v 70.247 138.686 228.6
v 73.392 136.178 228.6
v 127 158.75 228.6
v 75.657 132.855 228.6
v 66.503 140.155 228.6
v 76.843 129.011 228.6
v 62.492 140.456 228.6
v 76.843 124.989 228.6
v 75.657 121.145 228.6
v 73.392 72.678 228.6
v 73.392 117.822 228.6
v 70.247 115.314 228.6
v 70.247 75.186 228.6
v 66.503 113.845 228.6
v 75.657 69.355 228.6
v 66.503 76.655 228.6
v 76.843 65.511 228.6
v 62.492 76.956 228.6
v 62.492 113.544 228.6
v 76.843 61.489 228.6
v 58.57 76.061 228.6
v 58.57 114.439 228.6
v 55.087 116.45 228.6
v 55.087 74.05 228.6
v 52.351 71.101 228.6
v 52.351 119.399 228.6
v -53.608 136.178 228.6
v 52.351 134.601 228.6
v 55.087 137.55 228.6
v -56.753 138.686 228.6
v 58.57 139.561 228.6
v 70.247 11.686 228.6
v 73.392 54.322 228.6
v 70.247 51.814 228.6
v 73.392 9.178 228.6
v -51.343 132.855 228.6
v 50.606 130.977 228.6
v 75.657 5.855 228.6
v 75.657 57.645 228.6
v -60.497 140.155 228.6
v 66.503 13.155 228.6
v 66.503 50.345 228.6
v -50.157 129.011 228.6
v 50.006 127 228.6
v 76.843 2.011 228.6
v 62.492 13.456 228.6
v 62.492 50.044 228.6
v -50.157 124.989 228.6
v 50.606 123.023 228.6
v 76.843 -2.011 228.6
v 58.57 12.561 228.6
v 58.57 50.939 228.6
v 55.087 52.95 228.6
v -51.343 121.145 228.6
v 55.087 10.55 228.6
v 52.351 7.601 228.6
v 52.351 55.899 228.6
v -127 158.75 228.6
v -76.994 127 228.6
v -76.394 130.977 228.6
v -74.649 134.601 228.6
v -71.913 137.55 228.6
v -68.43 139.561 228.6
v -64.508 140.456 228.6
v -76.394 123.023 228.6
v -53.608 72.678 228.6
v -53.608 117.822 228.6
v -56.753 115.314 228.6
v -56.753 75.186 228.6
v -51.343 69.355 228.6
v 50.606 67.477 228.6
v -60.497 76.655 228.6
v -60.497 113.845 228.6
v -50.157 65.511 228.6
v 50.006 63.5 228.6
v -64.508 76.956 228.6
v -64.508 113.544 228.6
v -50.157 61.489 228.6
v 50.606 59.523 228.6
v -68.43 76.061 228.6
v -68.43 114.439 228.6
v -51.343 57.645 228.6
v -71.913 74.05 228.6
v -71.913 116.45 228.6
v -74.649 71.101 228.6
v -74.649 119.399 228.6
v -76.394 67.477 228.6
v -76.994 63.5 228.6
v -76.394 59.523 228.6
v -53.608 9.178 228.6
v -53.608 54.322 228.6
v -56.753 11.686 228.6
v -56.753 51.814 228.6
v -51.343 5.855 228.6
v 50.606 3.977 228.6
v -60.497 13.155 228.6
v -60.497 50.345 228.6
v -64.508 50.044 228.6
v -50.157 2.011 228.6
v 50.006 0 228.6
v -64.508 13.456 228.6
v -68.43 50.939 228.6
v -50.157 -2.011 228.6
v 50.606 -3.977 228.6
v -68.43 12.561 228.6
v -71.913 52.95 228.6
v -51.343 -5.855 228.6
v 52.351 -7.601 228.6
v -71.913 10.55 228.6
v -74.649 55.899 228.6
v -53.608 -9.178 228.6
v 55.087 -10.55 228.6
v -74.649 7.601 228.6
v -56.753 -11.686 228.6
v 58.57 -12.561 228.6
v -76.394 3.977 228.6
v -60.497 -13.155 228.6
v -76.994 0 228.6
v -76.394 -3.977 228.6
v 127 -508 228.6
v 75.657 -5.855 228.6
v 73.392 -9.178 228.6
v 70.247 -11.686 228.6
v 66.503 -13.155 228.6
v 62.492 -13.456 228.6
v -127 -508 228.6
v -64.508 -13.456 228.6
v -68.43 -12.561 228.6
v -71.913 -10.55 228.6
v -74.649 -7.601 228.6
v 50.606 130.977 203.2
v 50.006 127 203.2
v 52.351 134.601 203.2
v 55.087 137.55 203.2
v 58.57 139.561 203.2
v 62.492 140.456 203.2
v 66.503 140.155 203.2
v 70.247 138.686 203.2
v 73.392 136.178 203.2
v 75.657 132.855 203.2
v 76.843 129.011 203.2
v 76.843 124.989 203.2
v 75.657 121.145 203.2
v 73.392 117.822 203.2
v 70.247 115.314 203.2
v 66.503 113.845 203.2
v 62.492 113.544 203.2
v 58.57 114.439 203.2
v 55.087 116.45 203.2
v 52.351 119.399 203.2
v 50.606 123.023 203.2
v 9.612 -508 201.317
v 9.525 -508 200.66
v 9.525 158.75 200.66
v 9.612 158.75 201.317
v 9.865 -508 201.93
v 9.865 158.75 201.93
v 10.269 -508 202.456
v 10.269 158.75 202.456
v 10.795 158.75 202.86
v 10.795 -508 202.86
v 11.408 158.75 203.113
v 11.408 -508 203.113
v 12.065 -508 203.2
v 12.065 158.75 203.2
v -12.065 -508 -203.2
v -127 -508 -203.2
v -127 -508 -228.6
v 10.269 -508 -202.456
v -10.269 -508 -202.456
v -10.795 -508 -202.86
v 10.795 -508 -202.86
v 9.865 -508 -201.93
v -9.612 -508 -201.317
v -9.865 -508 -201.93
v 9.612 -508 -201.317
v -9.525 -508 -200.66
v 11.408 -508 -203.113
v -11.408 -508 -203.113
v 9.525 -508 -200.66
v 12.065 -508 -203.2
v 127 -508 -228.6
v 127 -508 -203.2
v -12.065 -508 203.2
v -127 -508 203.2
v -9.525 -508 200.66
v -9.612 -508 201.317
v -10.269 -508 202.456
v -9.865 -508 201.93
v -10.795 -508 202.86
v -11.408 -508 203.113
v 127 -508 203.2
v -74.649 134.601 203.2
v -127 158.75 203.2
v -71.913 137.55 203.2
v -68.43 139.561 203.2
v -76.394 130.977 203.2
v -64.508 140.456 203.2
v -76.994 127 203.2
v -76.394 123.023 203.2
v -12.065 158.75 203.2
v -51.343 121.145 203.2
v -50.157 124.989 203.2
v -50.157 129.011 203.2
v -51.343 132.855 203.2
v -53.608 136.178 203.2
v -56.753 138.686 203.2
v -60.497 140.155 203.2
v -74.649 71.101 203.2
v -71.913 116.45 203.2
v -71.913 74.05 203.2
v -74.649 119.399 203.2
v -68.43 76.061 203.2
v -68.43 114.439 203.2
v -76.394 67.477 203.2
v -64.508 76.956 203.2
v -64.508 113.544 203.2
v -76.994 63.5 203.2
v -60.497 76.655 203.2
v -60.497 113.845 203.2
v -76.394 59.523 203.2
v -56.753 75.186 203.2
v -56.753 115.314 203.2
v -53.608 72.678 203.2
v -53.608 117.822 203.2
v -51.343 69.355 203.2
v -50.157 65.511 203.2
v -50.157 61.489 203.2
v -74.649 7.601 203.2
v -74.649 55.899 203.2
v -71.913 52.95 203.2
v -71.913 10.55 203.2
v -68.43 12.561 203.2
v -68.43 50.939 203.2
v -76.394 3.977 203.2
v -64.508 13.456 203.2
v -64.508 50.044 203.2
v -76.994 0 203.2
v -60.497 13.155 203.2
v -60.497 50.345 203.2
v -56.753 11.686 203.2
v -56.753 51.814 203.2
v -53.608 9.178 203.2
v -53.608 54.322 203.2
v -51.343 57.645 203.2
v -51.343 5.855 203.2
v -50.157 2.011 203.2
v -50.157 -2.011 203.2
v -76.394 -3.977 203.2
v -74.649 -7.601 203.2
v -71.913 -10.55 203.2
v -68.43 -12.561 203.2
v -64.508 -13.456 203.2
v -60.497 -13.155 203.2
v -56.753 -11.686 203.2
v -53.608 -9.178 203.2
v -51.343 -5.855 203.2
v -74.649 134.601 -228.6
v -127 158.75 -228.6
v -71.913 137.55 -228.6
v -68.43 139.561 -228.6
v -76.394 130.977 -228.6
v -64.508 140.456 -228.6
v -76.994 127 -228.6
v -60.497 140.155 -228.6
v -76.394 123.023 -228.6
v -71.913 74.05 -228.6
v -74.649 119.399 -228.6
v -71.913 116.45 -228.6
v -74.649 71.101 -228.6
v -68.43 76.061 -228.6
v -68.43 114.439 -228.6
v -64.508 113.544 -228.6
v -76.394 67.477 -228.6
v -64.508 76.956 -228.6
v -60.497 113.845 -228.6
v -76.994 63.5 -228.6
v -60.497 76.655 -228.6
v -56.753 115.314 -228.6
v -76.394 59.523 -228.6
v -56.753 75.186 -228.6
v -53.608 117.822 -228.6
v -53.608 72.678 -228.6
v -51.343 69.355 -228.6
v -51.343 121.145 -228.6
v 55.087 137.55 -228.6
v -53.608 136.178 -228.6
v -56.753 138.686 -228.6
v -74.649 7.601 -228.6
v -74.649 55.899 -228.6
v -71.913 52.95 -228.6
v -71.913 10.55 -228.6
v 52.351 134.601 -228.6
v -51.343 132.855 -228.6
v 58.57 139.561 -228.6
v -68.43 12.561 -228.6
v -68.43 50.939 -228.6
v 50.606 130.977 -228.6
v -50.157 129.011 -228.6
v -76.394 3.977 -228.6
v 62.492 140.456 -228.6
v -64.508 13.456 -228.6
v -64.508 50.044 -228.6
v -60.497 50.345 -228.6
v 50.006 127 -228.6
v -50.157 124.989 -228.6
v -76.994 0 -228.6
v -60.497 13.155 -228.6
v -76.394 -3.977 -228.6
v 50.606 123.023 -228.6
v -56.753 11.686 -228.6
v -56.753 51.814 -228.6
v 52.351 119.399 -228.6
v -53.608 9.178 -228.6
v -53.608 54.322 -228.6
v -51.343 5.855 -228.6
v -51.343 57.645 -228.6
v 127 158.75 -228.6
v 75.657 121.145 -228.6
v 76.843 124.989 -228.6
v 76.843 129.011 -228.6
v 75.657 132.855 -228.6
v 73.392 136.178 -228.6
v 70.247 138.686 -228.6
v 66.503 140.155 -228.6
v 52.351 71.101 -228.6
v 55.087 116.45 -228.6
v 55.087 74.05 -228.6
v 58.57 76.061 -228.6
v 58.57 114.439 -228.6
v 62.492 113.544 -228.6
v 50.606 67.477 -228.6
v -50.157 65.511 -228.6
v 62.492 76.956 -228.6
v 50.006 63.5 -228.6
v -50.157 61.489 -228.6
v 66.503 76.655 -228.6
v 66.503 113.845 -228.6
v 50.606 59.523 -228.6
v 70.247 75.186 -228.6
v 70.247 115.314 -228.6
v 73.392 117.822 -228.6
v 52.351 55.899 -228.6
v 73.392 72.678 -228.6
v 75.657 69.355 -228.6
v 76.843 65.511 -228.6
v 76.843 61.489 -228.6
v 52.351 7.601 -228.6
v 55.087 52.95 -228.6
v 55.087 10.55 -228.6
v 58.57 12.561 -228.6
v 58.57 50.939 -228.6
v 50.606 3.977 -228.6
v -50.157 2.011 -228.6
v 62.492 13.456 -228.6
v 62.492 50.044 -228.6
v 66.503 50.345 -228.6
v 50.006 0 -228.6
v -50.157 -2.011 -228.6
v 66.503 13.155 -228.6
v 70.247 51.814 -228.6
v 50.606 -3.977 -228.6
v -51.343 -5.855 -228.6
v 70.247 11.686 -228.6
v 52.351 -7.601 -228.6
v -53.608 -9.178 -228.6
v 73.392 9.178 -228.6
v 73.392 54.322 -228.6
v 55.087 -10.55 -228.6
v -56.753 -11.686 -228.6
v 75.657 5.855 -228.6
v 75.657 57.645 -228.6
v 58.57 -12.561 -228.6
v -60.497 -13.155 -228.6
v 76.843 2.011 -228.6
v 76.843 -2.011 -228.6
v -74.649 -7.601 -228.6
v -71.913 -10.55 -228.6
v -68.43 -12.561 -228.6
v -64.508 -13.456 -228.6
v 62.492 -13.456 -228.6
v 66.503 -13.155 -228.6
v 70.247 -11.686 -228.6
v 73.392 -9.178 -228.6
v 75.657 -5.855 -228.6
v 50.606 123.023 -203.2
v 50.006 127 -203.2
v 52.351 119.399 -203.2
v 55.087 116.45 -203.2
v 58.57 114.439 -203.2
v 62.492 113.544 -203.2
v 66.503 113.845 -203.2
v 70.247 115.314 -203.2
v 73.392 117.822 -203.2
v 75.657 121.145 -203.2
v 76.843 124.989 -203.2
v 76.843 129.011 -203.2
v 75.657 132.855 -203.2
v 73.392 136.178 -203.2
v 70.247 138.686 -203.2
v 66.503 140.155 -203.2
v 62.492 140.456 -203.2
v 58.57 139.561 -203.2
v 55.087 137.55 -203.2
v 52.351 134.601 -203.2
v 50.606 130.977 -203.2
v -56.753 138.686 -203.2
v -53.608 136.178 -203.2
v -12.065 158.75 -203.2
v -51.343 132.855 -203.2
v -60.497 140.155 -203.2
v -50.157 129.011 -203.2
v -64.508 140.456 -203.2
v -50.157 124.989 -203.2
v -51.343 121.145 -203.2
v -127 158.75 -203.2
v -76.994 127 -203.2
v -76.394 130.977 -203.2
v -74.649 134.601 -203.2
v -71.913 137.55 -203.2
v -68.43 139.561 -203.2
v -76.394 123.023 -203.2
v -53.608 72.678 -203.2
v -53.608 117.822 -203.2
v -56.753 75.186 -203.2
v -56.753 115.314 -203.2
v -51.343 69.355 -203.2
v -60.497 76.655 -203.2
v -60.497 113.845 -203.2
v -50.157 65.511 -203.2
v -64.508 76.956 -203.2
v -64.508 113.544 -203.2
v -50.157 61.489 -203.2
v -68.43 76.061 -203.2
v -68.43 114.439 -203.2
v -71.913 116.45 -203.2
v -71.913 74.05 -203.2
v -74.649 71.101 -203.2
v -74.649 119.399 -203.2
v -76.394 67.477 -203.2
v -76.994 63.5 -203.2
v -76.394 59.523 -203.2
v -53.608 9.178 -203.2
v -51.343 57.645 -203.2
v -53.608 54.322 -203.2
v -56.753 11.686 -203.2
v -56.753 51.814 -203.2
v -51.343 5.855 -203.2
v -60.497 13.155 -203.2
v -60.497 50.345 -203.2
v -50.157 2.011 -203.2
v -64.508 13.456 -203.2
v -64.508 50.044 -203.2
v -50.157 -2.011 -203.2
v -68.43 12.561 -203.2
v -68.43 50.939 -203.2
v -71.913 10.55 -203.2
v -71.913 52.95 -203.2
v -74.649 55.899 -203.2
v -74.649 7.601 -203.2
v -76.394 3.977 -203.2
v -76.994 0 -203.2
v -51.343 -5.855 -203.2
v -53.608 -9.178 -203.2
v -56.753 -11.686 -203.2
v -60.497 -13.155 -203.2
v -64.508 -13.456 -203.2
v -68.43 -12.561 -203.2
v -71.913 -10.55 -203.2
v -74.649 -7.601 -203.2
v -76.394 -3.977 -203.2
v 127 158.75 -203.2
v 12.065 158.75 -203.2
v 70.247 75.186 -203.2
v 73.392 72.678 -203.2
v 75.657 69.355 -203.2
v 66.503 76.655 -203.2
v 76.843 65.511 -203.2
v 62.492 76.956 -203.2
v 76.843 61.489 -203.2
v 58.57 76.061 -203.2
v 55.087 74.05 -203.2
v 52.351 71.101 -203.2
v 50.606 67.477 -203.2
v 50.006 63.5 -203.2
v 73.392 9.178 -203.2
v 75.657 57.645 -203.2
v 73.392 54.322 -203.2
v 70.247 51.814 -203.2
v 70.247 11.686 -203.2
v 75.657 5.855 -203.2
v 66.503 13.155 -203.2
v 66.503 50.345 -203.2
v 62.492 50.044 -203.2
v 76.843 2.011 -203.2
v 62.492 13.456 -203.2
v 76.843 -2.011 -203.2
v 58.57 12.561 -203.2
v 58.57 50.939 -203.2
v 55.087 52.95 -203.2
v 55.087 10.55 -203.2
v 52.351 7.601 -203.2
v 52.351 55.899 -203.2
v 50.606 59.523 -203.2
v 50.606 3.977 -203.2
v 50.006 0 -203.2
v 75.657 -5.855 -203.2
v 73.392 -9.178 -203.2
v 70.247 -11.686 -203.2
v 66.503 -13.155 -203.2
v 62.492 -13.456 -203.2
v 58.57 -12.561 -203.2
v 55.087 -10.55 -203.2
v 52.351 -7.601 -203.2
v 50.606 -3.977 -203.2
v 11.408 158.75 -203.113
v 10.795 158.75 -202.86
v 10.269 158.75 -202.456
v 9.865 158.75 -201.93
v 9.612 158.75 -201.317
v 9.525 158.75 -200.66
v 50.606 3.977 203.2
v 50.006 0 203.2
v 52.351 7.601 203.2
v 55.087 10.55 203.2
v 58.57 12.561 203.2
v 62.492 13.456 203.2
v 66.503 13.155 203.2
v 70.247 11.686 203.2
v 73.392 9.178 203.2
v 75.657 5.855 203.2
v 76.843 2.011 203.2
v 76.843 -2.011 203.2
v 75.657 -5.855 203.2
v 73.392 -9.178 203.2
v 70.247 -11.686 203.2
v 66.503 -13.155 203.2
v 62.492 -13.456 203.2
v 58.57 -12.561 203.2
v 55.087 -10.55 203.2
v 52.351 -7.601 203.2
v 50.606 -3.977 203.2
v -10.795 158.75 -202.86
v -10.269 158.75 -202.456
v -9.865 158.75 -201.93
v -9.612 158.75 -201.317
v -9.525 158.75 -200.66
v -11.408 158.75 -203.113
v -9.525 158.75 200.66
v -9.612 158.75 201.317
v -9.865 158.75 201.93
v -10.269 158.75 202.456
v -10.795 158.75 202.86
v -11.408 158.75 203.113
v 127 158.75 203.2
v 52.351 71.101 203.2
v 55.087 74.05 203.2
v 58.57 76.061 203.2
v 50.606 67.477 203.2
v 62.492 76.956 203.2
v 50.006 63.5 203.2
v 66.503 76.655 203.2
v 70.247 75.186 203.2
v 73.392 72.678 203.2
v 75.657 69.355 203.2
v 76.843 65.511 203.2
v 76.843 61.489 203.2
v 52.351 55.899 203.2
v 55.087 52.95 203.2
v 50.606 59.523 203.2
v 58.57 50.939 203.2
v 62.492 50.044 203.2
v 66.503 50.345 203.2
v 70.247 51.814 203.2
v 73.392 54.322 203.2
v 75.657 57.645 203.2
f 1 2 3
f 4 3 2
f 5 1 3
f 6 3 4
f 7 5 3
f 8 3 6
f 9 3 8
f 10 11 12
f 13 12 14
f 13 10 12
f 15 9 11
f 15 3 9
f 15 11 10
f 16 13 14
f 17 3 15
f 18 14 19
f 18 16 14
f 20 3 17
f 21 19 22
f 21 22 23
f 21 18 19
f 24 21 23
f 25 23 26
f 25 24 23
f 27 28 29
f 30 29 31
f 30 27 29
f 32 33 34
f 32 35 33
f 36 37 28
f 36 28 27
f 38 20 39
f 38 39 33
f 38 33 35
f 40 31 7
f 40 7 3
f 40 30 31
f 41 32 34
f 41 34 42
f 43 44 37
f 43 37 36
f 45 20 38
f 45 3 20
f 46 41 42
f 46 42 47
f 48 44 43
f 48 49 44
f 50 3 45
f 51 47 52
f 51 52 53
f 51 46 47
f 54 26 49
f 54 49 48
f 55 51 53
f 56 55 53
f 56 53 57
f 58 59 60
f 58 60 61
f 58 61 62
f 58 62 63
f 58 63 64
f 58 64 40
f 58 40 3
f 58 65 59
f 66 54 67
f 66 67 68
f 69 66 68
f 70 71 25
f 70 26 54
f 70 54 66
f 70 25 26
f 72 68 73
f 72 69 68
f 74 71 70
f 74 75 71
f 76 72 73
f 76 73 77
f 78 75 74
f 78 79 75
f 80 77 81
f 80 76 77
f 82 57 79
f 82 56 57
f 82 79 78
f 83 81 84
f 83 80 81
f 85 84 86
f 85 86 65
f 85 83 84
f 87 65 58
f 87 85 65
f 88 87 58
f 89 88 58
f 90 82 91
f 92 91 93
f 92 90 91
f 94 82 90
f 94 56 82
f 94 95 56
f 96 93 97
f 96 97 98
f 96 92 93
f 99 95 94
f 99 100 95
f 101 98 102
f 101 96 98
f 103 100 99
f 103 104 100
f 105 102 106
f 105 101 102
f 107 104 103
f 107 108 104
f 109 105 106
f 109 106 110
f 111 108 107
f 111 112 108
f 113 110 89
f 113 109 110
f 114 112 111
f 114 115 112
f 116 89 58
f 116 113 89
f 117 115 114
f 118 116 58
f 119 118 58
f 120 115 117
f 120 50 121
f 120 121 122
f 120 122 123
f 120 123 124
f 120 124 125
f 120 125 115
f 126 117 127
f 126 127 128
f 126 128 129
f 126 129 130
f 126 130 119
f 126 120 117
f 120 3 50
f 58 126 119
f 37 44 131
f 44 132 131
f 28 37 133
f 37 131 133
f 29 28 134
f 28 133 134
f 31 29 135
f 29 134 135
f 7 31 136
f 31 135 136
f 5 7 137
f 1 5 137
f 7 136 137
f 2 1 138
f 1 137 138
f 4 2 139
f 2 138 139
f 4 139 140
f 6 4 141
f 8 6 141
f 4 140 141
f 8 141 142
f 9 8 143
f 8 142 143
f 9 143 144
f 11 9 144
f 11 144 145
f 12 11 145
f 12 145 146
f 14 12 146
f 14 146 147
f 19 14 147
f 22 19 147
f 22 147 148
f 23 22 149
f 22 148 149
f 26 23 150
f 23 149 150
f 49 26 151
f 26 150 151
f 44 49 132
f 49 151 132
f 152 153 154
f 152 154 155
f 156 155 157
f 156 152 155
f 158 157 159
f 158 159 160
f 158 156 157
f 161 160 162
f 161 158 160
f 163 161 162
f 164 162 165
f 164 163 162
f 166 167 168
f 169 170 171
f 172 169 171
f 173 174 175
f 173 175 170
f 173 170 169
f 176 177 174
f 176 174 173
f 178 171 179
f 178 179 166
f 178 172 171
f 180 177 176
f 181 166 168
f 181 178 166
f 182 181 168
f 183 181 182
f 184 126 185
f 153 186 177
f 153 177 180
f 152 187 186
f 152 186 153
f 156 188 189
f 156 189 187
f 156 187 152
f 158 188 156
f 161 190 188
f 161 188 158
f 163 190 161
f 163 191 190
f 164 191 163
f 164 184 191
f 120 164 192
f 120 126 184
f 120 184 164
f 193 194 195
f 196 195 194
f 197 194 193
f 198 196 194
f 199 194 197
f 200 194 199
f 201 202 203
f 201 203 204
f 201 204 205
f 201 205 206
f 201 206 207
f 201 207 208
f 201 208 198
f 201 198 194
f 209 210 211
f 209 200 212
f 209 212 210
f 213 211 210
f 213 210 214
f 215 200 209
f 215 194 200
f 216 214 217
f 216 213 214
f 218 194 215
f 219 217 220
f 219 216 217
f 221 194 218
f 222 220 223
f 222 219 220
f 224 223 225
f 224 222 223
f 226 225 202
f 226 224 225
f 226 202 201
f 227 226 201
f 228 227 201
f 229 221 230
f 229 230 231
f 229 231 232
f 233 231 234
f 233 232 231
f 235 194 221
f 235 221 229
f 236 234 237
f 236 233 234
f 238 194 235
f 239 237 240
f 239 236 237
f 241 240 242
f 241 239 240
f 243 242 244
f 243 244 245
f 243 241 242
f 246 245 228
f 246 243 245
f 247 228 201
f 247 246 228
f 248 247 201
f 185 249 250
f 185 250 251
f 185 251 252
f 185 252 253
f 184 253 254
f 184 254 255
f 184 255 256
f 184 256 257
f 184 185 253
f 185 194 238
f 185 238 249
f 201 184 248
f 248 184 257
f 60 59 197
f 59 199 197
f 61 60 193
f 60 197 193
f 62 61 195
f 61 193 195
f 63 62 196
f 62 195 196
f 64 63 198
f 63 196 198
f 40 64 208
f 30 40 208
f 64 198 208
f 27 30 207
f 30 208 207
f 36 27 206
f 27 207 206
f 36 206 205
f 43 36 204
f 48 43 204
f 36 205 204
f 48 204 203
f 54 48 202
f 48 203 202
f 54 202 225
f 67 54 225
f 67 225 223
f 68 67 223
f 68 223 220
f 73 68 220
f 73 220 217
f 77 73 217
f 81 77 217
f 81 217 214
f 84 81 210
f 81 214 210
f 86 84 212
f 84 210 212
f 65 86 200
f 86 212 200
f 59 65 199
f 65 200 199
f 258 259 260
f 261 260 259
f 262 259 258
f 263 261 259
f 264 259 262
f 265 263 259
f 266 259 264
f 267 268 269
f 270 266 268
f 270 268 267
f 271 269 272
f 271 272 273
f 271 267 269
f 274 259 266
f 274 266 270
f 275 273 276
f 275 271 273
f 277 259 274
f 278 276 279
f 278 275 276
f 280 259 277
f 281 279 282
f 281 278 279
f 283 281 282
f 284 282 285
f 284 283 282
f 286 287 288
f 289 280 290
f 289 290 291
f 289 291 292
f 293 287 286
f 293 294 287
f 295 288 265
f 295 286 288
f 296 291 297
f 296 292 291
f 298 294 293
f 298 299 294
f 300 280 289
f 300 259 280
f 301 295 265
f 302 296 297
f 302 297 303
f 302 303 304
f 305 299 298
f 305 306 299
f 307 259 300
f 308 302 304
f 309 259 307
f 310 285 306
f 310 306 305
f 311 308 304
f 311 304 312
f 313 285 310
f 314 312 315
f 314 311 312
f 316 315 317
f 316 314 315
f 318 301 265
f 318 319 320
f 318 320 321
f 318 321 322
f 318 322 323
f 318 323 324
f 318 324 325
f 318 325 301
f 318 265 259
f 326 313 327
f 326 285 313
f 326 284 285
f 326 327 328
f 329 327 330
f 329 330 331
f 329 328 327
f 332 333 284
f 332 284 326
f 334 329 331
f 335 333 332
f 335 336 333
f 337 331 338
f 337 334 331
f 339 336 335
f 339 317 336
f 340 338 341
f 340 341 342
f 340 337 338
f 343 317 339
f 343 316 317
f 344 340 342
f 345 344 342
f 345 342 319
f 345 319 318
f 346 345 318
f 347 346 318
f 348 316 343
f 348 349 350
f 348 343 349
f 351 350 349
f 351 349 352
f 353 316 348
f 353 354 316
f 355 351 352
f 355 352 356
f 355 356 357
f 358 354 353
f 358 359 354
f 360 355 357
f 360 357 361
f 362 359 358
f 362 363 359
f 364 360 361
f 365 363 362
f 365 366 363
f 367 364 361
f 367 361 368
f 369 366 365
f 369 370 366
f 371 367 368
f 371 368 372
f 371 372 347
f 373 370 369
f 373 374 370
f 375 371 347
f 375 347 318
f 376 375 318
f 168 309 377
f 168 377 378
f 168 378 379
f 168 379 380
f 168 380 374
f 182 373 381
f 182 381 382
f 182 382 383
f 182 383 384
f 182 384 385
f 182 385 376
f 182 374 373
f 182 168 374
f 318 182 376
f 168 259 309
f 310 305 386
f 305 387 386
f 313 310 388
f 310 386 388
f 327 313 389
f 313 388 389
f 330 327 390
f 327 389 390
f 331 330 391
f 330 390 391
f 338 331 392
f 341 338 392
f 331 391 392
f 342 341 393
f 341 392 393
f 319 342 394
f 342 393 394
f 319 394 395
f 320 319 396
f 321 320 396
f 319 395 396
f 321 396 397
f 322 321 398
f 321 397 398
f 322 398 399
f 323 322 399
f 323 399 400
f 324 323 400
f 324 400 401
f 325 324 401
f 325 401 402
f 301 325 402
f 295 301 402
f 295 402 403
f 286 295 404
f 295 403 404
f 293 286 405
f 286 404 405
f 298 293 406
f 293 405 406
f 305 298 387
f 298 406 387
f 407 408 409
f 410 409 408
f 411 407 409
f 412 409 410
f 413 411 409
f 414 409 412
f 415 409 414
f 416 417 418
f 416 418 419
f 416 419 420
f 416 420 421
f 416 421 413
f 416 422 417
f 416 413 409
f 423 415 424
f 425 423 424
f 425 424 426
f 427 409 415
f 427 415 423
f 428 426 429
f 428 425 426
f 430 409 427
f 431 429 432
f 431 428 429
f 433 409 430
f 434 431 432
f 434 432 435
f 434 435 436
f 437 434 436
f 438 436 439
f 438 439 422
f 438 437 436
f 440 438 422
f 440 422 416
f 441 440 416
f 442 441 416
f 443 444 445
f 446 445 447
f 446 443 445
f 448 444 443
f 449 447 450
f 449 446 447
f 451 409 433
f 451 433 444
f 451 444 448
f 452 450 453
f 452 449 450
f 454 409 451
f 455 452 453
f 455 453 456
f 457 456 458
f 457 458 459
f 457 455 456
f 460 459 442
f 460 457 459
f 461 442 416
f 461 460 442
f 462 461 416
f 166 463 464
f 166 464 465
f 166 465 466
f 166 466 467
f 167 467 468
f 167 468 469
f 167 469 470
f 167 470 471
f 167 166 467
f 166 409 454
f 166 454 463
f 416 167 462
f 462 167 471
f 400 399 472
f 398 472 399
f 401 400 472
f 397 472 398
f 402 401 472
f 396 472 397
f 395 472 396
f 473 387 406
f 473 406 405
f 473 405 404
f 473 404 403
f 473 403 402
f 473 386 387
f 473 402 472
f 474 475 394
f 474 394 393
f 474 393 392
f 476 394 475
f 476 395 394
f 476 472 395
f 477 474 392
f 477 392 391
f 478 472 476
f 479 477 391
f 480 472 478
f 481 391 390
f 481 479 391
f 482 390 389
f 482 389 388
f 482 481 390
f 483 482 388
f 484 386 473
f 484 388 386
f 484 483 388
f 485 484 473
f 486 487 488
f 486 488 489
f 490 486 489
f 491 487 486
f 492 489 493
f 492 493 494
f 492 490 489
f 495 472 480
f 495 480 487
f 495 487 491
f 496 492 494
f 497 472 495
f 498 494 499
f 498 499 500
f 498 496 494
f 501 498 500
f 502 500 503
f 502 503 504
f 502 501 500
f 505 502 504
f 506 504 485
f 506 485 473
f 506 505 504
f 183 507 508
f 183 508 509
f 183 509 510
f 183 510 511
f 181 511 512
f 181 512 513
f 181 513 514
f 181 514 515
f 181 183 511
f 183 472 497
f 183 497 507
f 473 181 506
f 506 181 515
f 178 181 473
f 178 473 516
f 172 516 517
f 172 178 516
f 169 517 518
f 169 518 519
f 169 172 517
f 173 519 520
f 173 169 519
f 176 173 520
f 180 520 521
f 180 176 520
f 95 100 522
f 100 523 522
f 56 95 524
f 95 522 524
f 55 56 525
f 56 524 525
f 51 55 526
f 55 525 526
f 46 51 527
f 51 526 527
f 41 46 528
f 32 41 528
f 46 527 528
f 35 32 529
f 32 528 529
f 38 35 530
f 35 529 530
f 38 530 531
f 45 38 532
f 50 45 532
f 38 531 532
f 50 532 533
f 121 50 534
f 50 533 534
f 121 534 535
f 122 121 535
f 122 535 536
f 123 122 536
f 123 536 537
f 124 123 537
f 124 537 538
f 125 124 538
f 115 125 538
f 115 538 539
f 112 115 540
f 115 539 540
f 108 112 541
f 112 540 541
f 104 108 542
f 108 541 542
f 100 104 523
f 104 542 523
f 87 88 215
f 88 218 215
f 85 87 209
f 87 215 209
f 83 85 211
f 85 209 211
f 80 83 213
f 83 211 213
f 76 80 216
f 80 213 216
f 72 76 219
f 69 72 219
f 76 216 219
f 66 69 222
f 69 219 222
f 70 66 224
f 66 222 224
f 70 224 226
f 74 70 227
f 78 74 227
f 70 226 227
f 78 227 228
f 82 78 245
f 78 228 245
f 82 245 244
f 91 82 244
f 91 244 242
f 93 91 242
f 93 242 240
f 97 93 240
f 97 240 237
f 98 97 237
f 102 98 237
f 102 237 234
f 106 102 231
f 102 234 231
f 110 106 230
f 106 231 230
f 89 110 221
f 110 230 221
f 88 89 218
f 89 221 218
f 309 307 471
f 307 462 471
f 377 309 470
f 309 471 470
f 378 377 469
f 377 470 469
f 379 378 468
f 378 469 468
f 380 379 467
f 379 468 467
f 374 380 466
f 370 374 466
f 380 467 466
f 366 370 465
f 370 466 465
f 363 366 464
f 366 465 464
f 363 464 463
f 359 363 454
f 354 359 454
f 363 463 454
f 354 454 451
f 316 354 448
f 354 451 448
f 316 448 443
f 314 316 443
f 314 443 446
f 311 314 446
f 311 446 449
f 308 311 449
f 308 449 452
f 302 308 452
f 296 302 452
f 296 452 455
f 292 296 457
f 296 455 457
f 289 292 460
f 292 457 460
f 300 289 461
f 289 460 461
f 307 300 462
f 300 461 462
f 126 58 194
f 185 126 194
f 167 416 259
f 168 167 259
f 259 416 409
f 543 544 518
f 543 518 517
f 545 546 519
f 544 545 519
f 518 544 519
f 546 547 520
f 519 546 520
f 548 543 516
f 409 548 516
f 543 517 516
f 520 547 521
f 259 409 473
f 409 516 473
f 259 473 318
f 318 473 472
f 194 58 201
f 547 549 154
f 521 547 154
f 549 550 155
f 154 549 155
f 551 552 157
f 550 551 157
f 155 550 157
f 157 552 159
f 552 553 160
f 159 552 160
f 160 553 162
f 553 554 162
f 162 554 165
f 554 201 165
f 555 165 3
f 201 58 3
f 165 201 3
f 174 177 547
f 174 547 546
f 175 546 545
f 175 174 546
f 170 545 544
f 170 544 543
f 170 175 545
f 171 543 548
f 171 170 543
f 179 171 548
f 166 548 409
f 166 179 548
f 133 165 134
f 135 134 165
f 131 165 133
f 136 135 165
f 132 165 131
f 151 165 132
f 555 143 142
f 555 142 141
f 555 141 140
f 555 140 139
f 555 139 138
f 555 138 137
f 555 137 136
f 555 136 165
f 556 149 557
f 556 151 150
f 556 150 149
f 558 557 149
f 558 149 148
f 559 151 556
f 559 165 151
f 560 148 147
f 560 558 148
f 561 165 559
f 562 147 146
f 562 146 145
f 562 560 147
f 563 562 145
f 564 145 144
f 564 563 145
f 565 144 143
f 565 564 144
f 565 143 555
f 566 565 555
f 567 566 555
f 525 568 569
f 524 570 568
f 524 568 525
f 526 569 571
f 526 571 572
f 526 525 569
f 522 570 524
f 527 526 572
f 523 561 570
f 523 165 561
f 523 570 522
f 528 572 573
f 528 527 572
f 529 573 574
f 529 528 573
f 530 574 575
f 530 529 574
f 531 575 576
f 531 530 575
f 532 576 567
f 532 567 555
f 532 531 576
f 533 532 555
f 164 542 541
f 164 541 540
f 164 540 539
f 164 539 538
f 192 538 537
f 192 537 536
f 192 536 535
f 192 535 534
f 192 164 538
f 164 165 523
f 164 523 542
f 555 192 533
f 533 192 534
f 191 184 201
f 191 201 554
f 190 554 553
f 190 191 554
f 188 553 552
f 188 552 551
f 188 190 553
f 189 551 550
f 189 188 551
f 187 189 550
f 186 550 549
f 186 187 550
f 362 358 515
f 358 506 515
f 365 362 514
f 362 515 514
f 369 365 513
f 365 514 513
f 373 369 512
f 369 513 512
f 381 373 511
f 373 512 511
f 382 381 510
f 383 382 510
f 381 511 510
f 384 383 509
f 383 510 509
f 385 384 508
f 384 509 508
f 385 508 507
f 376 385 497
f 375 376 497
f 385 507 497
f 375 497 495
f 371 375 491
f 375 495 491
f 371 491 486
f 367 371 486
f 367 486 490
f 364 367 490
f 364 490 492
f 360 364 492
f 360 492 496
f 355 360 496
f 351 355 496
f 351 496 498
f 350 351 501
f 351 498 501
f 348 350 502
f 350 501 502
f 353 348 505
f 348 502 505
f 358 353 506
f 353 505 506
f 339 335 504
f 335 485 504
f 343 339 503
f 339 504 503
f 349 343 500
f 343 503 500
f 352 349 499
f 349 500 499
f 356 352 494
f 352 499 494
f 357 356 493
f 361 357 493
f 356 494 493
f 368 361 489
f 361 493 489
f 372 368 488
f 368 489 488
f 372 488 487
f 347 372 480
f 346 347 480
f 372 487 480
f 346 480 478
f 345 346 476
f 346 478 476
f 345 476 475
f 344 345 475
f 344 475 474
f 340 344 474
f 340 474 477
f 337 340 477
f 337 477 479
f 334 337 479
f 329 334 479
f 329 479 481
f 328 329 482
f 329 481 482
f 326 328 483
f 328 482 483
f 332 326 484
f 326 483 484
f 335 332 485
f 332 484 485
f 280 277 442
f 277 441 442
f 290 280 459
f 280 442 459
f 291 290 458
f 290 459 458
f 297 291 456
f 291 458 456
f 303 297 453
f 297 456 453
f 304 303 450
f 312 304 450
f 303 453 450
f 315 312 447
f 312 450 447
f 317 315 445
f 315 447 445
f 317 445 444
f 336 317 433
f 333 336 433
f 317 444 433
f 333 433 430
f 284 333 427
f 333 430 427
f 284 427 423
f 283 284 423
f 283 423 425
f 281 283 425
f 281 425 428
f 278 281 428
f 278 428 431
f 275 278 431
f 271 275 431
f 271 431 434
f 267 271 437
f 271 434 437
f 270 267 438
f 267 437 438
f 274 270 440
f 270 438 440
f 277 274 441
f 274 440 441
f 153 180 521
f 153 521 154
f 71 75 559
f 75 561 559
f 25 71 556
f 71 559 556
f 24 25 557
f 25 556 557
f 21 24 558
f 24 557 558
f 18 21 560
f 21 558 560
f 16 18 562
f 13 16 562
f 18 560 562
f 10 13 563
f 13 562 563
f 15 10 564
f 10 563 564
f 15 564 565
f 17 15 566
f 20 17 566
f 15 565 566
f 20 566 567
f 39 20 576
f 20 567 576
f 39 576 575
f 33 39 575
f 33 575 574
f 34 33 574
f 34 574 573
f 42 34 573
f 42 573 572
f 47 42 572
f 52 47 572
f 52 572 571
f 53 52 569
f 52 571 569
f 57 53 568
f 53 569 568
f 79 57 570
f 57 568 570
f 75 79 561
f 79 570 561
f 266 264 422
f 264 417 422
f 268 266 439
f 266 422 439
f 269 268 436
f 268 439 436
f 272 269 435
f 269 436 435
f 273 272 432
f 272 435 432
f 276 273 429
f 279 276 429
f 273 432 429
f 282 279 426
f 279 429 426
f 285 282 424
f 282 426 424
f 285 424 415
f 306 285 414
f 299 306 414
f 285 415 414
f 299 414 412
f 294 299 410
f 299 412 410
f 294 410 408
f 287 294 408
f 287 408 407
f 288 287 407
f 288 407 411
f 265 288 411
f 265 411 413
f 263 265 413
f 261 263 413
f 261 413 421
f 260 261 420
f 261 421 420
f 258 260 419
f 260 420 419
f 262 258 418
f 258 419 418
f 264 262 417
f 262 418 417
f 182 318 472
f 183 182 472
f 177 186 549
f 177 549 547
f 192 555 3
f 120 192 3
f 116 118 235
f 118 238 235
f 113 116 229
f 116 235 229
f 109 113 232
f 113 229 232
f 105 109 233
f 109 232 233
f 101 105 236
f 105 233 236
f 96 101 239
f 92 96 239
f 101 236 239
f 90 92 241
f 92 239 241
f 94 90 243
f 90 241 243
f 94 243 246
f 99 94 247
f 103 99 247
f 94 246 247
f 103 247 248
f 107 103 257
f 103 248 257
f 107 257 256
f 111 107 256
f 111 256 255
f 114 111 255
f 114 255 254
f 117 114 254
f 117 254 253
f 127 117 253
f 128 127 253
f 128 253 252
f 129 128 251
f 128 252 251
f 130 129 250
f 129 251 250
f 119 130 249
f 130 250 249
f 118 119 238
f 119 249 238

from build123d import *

# Parameters (mm, degrees)
F1_DEPTH      = 508
F1_DEPTH_BACK = 158.75
F3_D          = 26.9875
F3_DEPTH      = 25.4
F3_TIP        = 8.107862978
F5_D          = 26.9875
F5_DEPTH      = 25.4
F5_TIP        = 8.107862978


# Not quite as in the source:
# - a feature names something its author has since deleted; it is built from what else it names


with BuildPart() as f1:
    # F0 (on Front) → F1 (new body, two sides)
    with BuildSketch(Plane.XZ) as f1_sk:
        with BuildLine():
            Line((127, -228.6), (127, -203.2))
            Line((127, -203.2), (12.065, -203.2))
            ThreePointArc((12.065, -203.2), (10.2689487758, -202.4560512242), (9.525, -200.66))
            Line((9.525, -200.66), (9.525, 200.66))
            ThreePointArc((9.525, 200.66), (10.2689487758, 202.4560512242), (12.065, 203.2))
            Line((12.065, 203.2), (127, 203.2))
            Line((127, 203.2), (127, 228.6))
            Line((127, 228.6), (-127, 228.6))
            Line((-127, 228.6), (-127, 203.2))
            Line((-127, 203.2), (-12.065, 203.2))
            ThreePointArc((-12.065, 203.2), (-10.2689487758, 202.4560512242), (-9.525, 200.66))
            Line((-9.525, 200.66), (-9.525, -200.66))
            ThreePointArc((-9.525, -200.66), (-10.2689487758, -202.4560512242), (-12.065, -203.2))
            Line((-12.065, -203.2), (-127, -203.2))
            Line((-127, -203.2), (-127, -228.6))
            Line((-127, -228.6), (127, -228.6))
        make_face()
    extrude(amount=F1_DEPTH)
    extrude(f1_sk.sketch, amount=-F1_DEPTH_BACK)

    # F3
    with Locations(Plane.XY.offset(228.6)):
        with Locations((63.5, 127), (63.5, 63.5), (63.5, 0), (-63.5, 0), (-63.5, 63.5), (-63.5, 127)):
            Hole(F3_D / 2, depth=F3_DEPTH)
            with Locations((0, 0, -(F3_DEPTH + F3_TIP / 2))):  # 118° drill point
                Cone(0, F3_D / 2, F3_TIP, mode=Mode.SUBTRACT)

    # F5
    with Locations(Plane(origin=(0, 0, -228.6), x_dir=(1, 0, 0), z_dir=(0, 0, -1))):
        with Locations((63.5, -127), (63.5, -63.5), (63.5, 0), (-63.5, 0), (-63.5, -63.5), (-63.5, -127)):
            Hole(F5_D / 2, depth=F5_DEPTH)
            with Locations((0, 0, -(F5_DEPTH + F5_TIP / 2))):  # 118° drill point
                Cone(0, F5_D / 2, F5_TIP, mode=Mode.SUBTRACT)


solid = f1.part
